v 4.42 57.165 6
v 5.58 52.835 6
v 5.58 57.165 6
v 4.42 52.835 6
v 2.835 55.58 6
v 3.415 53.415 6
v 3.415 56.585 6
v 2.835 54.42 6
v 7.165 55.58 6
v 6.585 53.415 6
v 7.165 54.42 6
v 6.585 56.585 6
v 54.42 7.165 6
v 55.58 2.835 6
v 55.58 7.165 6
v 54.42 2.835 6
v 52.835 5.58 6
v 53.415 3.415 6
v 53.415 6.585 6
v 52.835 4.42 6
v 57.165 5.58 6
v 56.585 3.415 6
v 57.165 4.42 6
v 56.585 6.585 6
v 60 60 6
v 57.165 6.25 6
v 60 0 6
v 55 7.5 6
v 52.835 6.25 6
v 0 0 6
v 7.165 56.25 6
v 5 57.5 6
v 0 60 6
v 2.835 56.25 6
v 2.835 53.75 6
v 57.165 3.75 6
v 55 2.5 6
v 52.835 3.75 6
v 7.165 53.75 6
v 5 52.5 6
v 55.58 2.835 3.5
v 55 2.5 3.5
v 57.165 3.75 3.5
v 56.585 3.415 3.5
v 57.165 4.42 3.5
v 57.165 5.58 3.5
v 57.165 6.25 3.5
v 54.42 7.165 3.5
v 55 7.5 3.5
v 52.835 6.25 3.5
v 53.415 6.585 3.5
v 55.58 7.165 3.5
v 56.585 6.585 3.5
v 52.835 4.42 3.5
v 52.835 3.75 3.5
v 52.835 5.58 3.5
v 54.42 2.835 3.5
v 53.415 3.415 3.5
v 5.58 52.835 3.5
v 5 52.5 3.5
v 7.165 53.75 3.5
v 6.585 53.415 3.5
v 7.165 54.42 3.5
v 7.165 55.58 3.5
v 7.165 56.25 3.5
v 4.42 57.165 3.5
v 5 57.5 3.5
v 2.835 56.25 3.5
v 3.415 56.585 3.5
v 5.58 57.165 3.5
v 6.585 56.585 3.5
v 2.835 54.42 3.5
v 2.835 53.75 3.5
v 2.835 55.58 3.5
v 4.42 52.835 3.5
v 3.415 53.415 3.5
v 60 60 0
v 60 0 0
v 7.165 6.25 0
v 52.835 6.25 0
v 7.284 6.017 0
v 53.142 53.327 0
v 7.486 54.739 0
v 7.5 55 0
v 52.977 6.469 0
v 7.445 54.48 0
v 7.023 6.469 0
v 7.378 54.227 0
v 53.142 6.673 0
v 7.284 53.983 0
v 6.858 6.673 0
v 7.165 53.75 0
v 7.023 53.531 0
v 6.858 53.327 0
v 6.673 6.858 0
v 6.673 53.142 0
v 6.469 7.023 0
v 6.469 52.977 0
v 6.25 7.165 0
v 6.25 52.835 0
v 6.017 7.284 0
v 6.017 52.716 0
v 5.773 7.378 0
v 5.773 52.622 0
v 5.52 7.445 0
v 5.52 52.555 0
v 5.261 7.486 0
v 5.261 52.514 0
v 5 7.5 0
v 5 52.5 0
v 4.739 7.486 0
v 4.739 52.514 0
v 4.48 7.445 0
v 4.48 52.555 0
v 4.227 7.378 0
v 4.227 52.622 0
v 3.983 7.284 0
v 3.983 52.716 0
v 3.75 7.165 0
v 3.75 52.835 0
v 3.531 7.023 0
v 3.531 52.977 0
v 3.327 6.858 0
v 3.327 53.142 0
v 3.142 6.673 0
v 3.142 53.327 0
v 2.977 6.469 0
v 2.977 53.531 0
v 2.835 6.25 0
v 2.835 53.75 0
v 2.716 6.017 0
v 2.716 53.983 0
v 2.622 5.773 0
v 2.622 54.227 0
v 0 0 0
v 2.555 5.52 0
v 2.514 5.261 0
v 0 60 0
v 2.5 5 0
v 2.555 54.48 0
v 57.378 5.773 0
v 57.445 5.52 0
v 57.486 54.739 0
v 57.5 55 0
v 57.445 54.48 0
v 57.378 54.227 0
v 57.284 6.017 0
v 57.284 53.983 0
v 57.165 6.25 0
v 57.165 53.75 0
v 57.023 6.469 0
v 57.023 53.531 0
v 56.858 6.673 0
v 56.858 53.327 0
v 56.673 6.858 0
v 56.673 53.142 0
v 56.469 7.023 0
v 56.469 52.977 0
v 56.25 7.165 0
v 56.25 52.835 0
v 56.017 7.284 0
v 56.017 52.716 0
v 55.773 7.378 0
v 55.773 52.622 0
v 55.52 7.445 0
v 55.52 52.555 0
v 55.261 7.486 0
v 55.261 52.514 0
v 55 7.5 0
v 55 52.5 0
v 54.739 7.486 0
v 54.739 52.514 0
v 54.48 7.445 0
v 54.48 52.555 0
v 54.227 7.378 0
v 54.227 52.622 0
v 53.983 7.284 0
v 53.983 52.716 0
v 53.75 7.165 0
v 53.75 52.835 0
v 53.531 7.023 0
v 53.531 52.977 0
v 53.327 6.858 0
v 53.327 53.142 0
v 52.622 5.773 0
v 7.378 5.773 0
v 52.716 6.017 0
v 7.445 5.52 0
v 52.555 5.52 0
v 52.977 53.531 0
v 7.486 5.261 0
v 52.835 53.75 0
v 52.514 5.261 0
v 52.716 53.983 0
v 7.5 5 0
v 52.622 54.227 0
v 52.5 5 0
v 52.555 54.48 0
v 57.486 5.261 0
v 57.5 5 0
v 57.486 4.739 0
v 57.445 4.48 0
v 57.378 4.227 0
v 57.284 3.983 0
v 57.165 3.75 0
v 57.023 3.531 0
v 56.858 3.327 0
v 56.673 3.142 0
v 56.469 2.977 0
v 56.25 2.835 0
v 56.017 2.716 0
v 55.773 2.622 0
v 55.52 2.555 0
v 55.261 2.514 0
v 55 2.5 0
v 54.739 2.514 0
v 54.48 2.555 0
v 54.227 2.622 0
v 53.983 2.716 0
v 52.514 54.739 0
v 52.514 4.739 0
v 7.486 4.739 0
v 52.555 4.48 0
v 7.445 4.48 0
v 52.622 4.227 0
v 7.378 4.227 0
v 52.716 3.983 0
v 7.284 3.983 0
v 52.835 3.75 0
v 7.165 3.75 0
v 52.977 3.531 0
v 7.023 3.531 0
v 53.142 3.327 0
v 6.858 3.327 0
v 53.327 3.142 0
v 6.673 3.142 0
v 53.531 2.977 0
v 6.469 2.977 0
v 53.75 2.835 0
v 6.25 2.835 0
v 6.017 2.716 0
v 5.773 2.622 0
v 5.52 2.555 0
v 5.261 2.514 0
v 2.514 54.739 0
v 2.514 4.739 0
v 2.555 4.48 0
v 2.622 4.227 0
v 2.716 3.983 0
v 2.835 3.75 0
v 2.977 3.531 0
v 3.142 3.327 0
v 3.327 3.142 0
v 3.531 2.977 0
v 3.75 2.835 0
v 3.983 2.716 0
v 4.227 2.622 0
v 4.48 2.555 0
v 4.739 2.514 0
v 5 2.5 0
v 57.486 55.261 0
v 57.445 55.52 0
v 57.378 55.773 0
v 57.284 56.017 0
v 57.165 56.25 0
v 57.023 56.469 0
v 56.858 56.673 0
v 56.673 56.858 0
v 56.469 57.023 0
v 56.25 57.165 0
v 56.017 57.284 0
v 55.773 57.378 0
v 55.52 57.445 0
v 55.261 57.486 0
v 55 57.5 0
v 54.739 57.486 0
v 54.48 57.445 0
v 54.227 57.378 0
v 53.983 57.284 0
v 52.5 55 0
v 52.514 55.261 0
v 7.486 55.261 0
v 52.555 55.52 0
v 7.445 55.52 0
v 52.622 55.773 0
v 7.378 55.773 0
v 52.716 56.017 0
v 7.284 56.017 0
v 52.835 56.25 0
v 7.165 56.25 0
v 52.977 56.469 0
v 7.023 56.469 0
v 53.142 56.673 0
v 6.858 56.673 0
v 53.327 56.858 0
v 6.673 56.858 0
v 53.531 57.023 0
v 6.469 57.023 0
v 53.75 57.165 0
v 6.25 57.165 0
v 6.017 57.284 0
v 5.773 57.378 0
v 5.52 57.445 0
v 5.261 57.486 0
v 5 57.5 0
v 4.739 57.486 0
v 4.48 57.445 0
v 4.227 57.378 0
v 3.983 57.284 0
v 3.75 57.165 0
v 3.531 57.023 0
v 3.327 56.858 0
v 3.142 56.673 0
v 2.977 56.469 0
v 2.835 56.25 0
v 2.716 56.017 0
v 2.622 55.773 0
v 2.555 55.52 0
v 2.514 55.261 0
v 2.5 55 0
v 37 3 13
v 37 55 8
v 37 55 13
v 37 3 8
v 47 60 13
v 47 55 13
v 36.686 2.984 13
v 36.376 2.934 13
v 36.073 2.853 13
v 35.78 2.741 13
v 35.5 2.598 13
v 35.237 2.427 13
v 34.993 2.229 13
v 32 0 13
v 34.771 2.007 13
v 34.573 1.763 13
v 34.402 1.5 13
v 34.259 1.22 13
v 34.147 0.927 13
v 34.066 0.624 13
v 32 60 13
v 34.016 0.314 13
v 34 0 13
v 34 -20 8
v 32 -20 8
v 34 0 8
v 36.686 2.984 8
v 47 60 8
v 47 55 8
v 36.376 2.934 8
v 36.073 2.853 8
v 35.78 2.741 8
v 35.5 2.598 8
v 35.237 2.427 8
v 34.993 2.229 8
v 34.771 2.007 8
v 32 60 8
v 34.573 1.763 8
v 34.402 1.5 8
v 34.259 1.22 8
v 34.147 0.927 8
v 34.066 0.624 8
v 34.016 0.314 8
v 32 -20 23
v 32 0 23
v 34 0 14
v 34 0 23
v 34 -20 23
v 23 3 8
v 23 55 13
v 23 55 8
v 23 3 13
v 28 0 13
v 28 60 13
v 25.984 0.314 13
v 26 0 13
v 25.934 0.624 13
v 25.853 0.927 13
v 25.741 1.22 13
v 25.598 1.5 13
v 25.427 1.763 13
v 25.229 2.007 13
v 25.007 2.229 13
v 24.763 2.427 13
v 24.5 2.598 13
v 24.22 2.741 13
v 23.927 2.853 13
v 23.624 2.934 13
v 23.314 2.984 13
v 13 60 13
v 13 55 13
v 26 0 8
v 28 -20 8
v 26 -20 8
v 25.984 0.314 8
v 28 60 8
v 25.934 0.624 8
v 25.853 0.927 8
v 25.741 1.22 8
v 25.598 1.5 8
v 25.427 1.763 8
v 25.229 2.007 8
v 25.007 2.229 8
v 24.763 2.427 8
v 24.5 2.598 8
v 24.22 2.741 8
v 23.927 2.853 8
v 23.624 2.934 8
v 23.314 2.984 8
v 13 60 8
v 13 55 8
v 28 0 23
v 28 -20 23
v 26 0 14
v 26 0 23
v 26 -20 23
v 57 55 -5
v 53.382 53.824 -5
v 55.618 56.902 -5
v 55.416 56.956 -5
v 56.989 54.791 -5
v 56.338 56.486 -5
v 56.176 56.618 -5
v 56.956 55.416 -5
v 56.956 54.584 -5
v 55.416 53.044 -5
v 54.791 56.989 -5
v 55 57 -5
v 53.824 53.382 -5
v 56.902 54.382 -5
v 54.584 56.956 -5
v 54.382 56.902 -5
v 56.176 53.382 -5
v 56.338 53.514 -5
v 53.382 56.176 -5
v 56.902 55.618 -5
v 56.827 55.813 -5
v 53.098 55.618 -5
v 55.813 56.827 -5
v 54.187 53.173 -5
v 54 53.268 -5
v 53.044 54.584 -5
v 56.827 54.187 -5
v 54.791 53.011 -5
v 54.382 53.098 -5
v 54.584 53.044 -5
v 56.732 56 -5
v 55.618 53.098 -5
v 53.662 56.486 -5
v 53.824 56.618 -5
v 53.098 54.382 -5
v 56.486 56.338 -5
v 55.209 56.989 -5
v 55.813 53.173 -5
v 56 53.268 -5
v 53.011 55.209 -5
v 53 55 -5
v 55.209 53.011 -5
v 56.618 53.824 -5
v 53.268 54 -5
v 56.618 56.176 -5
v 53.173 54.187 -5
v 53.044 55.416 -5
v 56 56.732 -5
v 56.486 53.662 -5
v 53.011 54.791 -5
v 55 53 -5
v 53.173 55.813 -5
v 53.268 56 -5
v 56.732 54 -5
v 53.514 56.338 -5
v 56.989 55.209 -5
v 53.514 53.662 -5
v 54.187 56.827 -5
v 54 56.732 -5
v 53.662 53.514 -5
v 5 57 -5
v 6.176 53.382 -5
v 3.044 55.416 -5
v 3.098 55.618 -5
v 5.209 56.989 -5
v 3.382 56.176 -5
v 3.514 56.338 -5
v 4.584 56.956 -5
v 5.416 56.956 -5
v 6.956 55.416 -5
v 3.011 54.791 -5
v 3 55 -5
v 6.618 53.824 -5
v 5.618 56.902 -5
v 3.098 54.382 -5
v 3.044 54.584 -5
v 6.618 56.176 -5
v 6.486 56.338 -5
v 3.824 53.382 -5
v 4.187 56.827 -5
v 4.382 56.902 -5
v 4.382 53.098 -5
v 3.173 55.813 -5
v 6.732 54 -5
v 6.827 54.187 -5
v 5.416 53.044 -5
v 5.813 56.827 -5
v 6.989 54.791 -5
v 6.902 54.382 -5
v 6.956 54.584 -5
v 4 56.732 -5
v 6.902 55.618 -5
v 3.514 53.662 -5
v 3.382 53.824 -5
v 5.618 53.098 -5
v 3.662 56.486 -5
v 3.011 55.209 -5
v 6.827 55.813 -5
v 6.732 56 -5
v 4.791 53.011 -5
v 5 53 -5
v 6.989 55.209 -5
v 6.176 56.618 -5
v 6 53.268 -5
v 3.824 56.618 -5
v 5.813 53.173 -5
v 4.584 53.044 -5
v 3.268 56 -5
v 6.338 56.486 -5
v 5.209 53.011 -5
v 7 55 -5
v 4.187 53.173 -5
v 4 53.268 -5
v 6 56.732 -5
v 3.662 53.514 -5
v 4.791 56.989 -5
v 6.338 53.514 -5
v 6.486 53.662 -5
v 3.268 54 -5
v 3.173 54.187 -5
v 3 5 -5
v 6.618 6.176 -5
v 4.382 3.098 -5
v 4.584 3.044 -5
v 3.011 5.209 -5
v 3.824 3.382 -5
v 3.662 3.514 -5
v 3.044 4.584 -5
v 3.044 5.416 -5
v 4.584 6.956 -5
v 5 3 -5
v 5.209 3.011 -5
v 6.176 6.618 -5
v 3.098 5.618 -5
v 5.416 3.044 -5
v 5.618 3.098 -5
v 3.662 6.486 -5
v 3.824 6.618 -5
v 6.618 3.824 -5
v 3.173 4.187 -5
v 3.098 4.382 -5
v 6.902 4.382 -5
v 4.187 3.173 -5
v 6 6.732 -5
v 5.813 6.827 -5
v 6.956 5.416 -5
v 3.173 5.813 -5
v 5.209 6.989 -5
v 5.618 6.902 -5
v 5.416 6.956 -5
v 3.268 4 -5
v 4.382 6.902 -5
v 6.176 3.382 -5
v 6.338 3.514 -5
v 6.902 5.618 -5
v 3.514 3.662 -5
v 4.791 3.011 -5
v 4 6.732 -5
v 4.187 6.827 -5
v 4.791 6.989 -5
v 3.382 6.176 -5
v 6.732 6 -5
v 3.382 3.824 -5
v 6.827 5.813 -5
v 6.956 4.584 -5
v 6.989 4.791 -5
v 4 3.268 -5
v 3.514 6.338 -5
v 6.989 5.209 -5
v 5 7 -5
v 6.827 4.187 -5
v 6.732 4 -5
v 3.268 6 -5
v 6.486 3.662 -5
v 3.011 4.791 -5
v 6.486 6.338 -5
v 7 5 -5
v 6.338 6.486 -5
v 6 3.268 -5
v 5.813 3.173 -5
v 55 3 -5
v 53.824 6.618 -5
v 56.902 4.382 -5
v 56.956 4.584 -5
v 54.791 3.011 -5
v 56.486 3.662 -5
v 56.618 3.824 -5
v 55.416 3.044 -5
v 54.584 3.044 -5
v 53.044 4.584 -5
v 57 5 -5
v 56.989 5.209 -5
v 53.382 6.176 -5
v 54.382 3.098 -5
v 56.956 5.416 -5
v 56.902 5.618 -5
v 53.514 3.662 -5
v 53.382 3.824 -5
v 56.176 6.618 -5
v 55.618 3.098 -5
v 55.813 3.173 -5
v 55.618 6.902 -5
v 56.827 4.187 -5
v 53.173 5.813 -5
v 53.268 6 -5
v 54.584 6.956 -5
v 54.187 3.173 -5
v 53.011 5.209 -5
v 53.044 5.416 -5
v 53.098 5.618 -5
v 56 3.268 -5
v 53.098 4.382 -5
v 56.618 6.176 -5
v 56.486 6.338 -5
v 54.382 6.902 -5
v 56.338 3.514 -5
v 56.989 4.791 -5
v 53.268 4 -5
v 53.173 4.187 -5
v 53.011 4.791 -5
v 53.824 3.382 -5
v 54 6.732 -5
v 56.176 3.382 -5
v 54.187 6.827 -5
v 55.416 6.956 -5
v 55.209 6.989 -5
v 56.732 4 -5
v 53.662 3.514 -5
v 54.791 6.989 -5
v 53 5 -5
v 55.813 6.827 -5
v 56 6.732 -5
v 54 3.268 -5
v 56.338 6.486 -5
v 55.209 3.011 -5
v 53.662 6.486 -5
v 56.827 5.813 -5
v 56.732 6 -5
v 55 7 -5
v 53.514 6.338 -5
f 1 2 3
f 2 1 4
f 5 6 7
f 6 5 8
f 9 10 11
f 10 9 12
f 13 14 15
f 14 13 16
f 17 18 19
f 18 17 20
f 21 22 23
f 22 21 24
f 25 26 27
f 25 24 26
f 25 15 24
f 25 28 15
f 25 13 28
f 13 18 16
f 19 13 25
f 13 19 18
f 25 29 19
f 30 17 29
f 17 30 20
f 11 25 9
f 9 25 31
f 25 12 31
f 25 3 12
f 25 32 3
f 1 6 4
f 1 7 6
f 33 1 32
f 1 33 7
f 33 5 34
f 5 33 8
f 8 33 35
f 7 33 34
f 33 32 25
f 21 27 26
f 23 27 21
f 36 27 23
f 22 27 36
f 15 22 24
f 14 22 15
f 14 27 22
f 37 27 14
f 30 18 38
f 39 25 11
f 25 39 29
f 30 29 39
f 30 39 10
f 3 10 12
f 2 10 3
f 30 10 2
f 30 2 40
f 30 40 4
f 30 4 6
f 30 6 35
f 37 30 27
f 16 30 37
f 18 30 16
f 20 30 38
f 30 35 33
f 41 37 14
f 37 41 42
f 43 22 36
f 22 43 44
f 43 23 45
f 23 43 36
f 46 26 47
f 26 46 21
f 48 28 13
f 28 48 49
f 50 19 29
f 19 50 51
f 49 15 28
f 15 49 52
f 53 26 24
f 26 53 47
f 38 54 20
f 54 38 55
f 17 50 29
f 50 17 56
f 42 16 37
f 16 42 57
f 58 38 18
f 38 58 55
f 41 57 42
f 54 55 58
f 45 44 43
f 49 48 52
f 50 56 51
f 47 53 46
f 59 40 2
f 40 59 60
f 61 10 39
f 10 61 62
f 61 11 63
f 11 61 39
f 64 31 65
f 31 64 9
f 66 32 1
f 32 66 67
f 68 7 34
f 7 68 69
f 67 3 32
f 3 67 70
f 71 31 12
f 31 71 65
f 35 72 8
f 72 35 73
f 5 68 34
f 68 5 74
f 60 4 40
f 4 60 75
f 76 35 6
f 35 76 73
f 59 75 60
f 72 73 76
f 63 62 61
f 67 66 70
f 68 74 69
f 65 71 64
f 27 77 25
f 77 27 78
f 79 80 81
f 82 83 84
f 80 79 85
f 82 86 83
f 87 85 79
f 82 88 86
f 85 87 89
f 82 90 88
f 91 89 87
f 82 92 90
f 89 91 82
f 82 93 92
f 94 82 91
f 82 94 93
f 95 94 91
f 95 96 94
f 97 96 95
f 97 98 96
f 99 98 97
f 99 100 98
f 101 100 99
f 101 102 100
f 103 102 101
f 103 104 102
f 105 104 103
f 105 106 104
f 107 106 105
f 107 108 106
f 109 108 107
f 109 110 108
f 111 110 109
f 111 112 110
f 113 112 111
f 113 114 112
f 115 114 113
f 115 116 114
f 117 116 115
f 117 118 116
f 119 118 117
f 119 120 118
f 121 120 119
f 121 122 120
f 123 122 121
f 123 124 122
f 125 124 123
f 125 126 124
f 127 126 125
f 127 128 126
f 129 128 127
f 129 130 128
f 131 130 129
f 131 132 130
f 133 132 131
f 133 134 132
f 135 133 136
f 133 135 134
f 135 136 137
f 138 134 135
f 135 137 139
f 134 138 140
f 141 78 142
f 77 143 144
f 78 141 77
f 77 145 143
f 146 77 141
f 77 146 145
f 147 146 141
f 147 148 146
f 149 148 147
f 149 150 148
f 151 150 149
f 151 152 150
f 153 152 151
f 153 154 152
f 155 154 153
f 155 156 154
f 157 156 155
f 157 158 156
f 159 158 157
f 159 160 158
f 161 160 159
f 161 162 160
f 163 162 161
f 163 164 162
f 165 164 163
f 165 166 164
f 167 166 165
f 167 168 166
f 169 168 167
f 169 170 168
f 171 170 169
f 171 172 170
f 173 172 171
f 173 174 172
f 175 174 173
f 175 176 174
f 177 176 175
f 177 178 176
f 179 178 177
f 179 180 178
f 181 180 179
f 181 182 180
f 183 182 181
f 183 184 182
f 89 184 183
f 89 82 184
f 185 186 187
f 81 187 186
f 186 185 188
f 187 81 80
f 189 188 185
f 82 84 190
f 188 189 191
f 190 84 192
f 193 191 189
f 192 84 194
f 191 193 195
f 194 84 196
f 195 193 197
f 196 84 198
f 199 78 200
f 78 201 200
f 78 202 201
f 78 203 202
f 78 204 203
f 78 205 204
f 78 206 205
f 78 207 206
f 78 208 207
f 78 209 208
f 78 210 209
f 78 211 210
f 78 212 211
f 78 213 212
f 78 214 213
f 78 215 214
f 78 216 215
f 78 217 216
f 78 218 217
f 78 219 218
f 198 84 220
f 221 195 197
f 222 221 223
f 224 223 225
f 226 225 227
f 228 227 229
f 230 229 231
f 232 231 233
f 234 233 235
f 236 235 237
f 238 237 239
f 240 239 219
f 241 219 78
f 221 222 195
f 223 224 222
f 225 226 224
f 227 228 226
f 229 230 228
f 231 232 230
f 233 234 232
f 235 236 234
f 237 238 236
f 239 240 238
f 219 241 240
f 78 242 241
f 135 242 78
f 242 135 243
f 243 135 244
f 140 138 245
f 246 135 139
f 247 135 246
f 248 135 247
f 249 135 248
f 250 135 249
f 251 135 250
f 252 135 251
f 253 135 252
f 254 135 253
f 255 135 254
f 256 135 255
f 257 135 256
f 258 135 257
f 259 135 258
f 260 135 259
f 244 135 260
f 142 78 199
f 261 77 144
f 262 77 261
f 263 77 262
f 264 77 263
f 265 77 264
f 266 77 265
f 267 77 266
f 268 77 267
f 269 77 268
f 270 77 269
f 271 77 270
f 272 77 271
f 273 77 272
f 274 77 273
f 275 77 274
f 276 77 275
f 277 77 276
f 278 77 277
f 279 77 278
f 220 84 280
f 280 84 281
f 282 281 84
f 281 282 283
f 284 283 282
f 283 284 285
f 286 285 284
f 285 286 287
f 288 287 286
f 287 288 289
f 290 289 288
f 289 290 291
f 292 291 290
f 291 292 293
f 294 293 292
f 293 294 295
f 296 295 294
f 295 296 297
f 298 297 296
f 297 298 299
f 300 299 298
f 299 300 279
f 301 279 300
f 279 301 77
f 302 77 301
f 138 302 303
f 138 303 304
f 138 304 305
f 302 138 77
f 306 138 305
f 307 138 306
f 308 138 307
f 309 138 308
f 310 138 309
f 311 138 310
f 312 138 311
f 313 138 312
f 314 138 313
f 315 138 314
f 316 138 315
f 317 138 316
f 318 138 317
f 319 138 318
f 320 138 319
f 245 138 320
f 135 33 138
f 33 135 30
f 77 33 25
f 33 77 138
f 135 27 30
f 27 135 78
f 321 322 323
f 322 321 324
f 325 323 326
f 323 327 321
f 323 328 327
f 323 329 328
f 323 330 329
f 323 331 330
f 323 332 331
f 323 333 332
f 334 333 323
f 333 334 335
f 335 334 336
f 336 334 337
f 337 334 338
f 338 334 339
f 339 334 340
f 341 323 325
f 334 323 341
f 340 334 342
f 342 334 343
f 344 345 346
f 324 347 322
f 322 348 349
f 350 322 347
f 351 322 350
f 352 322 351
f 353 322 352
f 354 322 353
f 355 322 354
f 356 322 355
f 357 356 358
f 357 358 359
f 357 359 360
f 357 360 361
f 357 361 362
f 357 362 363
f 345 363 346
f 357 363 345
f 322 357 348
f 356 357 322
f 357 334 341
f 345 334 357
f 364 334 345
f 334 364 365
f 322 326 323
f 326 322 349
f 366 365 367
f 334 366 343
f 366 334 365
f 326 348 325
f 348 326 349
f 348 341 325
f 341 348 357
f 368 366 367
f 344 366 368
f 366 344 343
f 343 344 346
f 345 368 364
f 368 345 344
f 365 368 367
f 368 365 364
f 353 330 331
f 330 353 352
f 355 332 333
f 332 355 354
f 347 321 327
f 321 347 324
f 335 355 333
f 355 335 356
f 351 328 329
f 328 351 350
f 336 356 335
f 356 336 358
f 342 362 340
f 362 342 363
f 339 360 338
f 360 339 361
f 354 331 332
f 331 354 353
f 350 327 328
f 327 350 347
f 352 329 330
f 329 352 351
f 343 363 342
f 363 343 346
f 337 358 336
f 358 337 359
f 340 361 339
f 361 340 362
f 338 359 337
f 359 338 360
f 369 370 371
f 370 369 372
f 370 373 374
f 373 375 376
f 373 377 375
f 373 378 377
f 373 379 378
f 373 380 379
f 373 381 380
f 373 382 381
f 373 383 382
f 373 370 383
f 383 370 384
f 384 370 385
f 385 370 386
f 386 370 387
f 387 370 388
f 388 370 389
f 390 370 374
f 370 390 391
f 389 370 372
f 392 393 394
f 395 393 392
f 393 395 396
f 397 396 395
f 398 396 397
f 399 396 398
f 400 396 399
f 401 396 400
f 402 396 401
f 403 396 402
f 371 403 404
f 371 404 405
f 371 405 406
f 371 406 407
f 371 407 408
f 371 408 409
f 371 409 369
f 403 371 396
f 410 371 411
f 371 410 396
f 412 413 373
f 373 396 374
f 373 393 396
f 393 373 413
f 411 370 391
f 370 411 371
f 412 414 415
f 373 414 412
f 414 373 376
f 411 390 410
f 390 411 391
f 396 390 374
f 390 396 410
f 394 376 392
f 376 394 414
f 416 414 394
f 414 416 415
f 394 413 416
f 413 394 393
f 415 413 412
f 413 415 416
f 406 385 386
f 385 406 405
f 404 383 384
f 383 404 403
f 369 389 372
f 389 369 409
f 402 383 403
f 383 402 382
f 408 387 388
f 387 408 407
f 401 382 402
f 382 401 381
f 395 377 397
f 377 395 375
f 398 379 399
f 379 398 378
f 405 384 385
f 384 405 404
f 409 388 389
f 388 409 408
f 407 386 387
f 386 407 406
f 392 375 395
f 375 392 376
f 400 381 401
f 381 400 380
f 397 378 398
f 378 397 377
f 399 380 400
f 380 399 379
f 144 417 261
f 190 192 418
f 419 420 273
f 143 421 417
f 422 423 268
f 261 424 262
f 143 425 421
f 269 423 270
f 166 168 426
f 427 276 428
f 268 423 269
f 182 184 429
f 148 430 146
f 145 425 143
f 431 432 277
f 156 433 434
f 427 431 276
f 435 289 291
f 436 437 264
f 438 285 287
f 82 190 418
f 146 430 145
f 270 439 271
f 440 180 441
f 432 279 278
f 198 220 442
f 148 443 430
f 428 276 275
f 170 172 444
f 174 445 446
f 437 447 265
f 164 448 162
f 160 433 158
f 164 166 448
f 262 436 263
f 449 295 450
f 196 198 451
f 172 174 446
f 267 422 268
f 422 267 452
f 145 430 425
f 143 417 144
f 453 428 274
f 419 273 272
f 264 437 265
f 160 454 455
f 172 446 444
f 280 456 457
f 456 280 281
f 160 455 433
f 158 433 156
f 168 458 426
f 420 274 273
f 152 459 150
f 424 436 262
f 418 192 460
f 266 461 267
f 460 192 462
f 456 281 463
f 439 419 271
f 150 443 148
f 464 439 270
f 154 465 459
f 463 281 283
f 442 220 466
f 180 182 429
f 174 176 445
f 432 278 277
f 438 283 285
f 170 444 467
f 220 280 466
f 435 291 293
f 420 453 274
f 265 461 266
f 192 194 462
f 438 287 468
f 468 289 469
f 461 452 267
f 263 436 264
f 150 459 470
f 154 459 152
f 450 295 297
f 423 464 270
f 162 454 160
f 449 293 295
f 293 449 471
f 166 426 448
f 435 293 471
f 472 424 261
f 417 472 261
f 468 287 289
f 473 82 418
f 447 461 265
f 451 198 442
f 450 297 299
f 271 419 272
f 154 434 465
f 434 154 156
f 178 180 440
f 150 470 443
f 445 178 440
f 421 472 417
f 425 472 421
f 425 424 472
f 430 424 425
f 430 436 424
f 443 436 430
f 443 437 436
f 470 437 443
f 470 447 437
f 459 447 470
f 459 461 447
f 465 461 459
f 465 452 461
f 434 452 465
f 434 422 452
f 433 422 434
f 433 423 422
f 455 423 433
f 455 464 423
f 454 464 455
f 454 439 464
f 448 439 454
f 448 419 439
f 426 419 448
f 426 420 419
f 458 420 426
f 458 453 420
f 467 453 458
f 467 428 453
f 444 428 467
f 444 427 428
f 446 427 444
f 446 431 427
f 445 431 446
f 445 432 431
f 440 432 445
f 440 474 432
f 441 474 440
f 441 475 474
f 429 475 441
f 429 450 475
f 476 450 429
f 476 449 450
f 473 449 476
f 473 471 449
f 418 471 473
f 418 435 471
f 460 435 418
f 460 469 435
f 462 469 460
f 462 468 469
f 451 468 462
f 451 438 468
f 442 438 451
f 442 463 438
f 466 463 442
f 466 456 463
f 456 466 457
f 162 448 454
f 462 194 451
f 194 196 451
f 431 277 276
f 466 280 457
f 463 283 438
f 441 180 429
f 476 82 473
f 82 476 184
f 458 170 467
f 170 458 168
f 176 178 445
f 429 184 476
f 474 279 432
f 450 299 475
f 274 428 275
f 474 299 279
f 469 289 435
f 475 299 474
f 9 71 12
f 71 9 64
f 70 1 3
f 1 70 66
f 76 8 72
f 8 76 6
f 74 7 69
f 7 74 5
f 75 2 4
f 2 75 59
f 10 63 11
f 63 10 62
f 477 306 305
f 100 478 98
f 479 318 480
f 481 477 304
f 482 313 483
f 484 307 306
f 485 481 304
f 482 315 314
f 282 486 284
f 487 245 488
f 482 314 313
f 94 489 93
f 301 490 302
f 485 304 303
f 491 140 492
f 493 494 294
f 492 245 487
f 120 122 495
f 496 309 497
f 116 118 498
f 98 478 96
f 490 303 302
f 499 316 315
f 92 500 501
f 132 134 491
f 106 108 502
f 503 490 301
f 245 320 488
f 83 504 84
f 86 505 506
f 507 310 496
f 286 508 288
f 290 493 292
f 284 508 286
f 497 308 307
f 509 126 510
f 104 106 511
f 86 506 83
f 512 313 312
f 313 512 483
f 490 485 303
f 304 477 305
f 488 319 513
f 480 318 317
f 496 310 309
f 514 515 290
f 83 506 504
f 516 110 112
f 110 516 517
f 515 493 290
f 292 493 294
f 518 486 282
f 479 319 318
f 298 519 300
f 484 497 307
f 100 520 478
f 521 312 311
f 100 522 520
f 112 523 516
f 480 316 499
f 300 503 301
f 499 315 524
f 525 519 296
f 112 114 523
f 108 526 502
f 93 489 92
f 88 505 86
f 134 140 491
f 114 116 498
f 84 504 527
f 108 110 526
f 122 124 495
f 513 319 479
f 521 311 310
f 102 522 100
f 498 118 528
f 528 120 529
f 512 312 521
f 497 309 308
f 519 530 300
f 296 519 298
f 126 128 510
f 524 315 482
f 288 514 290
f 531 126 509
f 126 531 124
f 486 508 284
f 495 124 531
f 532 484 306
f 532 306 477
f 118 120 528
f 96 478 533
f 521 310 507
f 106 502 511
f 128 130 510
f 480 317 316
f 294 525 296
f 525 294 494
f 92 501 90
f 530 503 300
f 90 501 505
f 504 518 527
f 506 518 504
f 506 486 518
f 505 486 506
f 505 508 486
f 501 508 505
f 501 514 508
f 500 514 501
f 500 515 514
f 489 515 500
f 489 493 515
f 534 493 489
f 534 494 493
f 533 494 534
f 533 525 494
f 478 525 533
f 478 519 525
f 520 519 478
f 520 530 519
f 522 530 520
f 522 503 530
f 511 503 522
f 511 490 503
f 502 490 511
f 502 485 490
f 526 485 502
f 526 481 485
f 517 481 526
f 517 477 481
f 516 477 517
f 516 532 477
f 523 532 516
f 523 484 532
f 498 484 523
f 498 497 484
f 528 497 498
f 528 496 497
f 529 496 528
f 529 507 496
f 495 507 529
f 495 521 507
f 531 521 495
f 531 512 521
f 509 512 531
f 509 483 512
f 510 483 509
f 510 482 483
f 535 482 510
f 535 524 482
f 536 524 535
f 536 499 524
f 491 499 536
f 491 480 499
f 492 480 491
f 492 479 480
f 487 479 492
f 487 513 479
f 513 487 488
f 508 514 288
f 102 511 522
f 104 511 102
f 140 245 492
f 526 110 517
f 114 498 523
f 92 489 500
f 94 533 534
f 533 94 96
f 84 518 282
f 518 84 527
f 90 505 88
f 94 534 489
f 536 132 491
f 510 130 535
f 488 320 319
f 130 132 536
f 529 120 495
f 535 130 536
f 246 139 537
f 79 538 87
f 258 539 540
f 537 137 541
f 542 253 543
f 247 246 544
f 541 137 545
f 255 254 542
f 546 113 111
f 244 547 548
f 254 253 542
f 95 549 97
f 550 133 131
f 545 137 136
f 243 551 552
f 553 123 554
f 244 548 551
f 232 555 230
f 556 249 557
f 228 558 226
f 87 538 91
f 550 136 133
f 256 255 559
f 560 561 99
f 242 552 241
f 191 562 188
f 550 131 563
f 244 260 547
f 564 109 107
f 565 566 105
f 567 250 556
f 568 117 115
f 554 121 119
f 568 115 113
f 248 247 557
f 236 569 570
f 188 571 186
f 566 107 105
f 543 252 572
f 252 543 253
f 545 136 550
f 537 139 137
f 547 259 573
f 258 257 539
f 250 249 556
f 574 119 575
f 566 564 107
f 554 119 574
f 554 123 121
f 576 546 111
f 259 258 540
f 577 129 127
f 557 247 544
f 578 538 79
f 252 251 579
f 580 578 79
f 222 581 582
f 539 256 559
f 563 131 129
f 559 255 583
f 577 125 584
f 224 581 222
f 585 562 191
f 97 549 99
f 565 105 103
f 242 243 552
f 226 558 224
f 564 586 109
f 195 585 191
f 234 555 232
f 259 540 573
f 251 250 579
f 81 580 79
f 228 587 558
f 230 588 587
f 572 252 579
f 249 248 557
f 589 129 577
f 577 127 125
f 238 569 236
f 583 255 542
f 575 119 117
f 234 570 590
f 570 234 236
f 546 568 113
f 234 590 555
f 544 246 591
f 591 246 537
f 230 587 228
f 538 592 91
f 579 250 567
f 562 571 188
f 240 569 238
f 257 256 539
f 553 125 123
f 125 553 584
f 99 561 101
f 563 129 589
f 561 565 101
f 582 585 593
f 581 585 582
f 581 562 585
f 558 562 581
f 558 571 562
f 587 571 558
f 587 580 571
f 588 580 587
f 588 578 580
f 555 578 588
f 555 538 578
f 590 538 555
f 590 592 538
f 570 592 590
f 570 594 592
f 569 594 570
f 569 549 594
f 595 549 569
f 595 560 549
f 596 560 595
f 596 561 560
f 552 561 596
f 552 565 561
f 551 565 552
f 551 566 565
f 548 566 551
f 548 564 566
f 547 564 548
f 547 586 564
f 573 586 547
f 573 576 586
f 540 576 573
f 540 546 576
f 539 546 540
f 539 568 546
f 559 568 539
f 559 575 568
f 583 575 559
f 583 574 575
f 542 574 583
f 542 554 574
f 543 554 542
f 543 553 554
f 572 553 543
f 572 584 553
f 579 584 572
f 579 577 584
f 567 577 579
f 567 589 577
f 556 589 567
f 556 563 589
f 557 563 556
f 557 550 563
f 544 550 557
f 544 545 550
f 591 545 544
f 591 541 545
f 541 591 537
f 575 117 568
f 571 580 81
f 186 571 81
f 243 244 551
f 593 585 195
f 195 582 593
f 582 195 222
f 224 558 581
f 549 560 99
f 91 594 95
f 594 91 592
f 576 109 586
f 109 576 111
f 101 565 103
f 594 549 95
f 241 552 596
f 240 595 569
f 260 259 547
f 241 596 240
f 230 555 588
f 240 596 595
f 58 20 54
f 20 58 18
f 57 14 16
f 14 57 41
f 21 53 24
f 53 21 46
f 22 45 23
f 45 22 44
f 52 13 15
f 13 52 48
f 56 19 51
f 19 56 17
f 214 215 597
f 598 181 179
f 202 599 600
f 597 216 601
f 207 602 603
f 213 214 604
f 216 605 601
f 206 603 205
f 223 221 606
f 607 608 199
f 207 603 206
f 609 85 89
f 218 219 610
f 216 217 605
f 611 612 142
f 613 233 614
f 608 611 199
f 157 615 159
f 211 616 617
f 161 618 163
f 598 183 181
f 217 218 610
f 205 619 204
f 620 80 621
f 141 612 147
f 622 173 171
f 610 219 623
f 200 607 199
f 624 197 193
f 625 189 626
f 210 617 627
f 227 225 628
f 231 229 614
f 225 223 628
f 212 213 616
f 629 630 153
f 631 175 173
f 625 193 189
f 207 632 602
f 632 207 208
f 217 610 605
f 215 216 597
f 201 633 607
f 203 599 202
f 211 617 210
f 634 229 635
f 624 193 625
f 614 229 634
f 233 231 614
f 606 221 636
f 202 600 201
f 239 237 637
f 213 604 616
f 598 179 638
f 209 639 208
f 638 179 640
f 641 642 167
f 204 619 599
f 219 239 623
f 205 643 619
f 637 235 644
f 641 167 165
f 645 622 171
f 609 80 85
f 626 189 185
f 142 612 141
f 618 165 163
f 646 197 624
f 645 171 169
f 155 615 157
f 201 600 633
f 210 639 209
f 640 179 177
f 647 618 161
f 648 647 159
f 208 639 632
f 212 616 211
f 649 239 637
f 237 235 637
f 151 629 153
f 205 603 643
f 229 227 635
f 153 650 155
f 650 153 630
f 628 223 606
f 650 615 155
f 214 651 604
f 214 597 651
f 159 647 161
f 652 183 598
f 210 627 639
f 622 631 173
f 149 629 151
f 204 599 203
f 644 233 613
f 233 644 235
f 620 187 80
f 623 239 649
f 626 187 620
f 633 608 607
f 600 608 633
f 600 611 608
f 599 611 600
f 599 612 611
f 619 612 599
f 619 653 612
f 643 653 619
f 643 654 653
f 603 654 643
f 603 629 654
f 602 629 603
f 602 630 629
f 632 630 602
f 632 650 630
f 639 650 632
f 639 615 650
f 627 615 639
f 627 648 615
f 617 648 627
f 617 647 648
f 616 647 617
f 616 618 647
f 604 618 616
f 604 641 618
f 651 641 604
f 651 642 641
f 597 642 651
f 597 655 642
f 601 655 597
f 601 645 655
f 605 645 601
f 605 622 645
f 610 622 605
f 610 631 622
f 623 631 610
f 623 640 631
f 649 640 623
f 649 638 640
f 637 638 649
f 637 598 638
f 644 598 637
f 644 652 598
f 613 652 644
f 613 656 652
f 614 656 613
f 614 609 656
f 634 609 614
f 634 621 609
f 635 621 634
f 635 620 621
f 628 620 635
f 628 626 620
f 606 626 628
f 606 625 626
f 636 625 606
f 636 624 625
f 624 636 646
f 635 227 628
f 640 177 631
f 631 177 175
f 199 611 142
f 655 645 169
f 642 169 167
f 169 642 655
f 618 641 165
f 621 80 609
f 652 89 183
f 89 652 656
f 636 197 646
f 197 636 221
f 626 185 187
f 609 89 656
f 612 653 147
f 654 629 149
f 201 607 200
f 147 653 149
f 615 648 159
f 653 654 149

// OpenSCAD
// Morse paddle

// Base dimensions
$fn = 60;
BASE = 60;

module nut_cavity() {
	// Nut dimensions
	m3nutd = 5; // nut diameter
	m3nuth = 3; // nut height
	m3hole = 3; // hole diameter

	union(){
		cylinder(r=m3hole/2,h=8); // screw hole
		rotate(a=30) cylinder(r=m3nutd/2,h=1+m3nuth/2,$fn=6); // screw nut cavity
	}
}

module base()
{
	// base with holes
	difference() {				
		cube([BASE,BASE,6]);
		// hex nut holes
		translate([5,5,0+6]) mirror([0,0,1]) nut_cavity();	// #1
		translate([BASE-5,5,0+6]) mirror([0,0,1]) nut_cavity();	// #2
		translate([5,BASE-5,0+6]) mirror([0,0,1]) nut_cavity();	// #3
		translate([BASE-5,BASE-5,0+6]) mirror([0,0,1]) nut_cavity();	// #4
	}
}

module arm()
{
	// Design rules: construct for 3D printing, then rotate
	difference() {
		union() {
			cube([5,BASE-5,5]); //
			translate([0,BASE-5,0]) cube([15,5,5]); //
			translate([2,-20,0]) rotate([0,-90,0]) cube([15,20,2]);  // palheta
		}
		translate([5,0,0]) cylinder(r=3,h=6); // curvatura
	}
}

module foot() {
	cylinder(h=5, d1=5, d2=4);
}

module key()
{
		ARM_GAP = 2;
		EXPLODE = 0;

		// base
		base();

		// arms
		translate([BASE/2+ARM_GAP,0,8]) color("Red") arm();  				// right arm
		translate([BASE/2-ARM_GAP,0,8]) mirror([1,0,0]) color("Red") arm();  // left arm
		
		// 4 feet and 4 screws
		translate([BASE/2,BASE/2,0])		// center in base
		for(r=[0:4]) {
			rotate([0,0,r*360/4]) {
				translate([BASE/2-5,BASE/2-5,-EXPLODE]) mirror([0,0,1]) color("Black")foot();  // feet
				translate([BASE/2-5,BASE/2-5,6+EXPLODE]) mirror([0,0,1]) color("Grey")nut_cavity(); // screws
			}
		}
}

key();
